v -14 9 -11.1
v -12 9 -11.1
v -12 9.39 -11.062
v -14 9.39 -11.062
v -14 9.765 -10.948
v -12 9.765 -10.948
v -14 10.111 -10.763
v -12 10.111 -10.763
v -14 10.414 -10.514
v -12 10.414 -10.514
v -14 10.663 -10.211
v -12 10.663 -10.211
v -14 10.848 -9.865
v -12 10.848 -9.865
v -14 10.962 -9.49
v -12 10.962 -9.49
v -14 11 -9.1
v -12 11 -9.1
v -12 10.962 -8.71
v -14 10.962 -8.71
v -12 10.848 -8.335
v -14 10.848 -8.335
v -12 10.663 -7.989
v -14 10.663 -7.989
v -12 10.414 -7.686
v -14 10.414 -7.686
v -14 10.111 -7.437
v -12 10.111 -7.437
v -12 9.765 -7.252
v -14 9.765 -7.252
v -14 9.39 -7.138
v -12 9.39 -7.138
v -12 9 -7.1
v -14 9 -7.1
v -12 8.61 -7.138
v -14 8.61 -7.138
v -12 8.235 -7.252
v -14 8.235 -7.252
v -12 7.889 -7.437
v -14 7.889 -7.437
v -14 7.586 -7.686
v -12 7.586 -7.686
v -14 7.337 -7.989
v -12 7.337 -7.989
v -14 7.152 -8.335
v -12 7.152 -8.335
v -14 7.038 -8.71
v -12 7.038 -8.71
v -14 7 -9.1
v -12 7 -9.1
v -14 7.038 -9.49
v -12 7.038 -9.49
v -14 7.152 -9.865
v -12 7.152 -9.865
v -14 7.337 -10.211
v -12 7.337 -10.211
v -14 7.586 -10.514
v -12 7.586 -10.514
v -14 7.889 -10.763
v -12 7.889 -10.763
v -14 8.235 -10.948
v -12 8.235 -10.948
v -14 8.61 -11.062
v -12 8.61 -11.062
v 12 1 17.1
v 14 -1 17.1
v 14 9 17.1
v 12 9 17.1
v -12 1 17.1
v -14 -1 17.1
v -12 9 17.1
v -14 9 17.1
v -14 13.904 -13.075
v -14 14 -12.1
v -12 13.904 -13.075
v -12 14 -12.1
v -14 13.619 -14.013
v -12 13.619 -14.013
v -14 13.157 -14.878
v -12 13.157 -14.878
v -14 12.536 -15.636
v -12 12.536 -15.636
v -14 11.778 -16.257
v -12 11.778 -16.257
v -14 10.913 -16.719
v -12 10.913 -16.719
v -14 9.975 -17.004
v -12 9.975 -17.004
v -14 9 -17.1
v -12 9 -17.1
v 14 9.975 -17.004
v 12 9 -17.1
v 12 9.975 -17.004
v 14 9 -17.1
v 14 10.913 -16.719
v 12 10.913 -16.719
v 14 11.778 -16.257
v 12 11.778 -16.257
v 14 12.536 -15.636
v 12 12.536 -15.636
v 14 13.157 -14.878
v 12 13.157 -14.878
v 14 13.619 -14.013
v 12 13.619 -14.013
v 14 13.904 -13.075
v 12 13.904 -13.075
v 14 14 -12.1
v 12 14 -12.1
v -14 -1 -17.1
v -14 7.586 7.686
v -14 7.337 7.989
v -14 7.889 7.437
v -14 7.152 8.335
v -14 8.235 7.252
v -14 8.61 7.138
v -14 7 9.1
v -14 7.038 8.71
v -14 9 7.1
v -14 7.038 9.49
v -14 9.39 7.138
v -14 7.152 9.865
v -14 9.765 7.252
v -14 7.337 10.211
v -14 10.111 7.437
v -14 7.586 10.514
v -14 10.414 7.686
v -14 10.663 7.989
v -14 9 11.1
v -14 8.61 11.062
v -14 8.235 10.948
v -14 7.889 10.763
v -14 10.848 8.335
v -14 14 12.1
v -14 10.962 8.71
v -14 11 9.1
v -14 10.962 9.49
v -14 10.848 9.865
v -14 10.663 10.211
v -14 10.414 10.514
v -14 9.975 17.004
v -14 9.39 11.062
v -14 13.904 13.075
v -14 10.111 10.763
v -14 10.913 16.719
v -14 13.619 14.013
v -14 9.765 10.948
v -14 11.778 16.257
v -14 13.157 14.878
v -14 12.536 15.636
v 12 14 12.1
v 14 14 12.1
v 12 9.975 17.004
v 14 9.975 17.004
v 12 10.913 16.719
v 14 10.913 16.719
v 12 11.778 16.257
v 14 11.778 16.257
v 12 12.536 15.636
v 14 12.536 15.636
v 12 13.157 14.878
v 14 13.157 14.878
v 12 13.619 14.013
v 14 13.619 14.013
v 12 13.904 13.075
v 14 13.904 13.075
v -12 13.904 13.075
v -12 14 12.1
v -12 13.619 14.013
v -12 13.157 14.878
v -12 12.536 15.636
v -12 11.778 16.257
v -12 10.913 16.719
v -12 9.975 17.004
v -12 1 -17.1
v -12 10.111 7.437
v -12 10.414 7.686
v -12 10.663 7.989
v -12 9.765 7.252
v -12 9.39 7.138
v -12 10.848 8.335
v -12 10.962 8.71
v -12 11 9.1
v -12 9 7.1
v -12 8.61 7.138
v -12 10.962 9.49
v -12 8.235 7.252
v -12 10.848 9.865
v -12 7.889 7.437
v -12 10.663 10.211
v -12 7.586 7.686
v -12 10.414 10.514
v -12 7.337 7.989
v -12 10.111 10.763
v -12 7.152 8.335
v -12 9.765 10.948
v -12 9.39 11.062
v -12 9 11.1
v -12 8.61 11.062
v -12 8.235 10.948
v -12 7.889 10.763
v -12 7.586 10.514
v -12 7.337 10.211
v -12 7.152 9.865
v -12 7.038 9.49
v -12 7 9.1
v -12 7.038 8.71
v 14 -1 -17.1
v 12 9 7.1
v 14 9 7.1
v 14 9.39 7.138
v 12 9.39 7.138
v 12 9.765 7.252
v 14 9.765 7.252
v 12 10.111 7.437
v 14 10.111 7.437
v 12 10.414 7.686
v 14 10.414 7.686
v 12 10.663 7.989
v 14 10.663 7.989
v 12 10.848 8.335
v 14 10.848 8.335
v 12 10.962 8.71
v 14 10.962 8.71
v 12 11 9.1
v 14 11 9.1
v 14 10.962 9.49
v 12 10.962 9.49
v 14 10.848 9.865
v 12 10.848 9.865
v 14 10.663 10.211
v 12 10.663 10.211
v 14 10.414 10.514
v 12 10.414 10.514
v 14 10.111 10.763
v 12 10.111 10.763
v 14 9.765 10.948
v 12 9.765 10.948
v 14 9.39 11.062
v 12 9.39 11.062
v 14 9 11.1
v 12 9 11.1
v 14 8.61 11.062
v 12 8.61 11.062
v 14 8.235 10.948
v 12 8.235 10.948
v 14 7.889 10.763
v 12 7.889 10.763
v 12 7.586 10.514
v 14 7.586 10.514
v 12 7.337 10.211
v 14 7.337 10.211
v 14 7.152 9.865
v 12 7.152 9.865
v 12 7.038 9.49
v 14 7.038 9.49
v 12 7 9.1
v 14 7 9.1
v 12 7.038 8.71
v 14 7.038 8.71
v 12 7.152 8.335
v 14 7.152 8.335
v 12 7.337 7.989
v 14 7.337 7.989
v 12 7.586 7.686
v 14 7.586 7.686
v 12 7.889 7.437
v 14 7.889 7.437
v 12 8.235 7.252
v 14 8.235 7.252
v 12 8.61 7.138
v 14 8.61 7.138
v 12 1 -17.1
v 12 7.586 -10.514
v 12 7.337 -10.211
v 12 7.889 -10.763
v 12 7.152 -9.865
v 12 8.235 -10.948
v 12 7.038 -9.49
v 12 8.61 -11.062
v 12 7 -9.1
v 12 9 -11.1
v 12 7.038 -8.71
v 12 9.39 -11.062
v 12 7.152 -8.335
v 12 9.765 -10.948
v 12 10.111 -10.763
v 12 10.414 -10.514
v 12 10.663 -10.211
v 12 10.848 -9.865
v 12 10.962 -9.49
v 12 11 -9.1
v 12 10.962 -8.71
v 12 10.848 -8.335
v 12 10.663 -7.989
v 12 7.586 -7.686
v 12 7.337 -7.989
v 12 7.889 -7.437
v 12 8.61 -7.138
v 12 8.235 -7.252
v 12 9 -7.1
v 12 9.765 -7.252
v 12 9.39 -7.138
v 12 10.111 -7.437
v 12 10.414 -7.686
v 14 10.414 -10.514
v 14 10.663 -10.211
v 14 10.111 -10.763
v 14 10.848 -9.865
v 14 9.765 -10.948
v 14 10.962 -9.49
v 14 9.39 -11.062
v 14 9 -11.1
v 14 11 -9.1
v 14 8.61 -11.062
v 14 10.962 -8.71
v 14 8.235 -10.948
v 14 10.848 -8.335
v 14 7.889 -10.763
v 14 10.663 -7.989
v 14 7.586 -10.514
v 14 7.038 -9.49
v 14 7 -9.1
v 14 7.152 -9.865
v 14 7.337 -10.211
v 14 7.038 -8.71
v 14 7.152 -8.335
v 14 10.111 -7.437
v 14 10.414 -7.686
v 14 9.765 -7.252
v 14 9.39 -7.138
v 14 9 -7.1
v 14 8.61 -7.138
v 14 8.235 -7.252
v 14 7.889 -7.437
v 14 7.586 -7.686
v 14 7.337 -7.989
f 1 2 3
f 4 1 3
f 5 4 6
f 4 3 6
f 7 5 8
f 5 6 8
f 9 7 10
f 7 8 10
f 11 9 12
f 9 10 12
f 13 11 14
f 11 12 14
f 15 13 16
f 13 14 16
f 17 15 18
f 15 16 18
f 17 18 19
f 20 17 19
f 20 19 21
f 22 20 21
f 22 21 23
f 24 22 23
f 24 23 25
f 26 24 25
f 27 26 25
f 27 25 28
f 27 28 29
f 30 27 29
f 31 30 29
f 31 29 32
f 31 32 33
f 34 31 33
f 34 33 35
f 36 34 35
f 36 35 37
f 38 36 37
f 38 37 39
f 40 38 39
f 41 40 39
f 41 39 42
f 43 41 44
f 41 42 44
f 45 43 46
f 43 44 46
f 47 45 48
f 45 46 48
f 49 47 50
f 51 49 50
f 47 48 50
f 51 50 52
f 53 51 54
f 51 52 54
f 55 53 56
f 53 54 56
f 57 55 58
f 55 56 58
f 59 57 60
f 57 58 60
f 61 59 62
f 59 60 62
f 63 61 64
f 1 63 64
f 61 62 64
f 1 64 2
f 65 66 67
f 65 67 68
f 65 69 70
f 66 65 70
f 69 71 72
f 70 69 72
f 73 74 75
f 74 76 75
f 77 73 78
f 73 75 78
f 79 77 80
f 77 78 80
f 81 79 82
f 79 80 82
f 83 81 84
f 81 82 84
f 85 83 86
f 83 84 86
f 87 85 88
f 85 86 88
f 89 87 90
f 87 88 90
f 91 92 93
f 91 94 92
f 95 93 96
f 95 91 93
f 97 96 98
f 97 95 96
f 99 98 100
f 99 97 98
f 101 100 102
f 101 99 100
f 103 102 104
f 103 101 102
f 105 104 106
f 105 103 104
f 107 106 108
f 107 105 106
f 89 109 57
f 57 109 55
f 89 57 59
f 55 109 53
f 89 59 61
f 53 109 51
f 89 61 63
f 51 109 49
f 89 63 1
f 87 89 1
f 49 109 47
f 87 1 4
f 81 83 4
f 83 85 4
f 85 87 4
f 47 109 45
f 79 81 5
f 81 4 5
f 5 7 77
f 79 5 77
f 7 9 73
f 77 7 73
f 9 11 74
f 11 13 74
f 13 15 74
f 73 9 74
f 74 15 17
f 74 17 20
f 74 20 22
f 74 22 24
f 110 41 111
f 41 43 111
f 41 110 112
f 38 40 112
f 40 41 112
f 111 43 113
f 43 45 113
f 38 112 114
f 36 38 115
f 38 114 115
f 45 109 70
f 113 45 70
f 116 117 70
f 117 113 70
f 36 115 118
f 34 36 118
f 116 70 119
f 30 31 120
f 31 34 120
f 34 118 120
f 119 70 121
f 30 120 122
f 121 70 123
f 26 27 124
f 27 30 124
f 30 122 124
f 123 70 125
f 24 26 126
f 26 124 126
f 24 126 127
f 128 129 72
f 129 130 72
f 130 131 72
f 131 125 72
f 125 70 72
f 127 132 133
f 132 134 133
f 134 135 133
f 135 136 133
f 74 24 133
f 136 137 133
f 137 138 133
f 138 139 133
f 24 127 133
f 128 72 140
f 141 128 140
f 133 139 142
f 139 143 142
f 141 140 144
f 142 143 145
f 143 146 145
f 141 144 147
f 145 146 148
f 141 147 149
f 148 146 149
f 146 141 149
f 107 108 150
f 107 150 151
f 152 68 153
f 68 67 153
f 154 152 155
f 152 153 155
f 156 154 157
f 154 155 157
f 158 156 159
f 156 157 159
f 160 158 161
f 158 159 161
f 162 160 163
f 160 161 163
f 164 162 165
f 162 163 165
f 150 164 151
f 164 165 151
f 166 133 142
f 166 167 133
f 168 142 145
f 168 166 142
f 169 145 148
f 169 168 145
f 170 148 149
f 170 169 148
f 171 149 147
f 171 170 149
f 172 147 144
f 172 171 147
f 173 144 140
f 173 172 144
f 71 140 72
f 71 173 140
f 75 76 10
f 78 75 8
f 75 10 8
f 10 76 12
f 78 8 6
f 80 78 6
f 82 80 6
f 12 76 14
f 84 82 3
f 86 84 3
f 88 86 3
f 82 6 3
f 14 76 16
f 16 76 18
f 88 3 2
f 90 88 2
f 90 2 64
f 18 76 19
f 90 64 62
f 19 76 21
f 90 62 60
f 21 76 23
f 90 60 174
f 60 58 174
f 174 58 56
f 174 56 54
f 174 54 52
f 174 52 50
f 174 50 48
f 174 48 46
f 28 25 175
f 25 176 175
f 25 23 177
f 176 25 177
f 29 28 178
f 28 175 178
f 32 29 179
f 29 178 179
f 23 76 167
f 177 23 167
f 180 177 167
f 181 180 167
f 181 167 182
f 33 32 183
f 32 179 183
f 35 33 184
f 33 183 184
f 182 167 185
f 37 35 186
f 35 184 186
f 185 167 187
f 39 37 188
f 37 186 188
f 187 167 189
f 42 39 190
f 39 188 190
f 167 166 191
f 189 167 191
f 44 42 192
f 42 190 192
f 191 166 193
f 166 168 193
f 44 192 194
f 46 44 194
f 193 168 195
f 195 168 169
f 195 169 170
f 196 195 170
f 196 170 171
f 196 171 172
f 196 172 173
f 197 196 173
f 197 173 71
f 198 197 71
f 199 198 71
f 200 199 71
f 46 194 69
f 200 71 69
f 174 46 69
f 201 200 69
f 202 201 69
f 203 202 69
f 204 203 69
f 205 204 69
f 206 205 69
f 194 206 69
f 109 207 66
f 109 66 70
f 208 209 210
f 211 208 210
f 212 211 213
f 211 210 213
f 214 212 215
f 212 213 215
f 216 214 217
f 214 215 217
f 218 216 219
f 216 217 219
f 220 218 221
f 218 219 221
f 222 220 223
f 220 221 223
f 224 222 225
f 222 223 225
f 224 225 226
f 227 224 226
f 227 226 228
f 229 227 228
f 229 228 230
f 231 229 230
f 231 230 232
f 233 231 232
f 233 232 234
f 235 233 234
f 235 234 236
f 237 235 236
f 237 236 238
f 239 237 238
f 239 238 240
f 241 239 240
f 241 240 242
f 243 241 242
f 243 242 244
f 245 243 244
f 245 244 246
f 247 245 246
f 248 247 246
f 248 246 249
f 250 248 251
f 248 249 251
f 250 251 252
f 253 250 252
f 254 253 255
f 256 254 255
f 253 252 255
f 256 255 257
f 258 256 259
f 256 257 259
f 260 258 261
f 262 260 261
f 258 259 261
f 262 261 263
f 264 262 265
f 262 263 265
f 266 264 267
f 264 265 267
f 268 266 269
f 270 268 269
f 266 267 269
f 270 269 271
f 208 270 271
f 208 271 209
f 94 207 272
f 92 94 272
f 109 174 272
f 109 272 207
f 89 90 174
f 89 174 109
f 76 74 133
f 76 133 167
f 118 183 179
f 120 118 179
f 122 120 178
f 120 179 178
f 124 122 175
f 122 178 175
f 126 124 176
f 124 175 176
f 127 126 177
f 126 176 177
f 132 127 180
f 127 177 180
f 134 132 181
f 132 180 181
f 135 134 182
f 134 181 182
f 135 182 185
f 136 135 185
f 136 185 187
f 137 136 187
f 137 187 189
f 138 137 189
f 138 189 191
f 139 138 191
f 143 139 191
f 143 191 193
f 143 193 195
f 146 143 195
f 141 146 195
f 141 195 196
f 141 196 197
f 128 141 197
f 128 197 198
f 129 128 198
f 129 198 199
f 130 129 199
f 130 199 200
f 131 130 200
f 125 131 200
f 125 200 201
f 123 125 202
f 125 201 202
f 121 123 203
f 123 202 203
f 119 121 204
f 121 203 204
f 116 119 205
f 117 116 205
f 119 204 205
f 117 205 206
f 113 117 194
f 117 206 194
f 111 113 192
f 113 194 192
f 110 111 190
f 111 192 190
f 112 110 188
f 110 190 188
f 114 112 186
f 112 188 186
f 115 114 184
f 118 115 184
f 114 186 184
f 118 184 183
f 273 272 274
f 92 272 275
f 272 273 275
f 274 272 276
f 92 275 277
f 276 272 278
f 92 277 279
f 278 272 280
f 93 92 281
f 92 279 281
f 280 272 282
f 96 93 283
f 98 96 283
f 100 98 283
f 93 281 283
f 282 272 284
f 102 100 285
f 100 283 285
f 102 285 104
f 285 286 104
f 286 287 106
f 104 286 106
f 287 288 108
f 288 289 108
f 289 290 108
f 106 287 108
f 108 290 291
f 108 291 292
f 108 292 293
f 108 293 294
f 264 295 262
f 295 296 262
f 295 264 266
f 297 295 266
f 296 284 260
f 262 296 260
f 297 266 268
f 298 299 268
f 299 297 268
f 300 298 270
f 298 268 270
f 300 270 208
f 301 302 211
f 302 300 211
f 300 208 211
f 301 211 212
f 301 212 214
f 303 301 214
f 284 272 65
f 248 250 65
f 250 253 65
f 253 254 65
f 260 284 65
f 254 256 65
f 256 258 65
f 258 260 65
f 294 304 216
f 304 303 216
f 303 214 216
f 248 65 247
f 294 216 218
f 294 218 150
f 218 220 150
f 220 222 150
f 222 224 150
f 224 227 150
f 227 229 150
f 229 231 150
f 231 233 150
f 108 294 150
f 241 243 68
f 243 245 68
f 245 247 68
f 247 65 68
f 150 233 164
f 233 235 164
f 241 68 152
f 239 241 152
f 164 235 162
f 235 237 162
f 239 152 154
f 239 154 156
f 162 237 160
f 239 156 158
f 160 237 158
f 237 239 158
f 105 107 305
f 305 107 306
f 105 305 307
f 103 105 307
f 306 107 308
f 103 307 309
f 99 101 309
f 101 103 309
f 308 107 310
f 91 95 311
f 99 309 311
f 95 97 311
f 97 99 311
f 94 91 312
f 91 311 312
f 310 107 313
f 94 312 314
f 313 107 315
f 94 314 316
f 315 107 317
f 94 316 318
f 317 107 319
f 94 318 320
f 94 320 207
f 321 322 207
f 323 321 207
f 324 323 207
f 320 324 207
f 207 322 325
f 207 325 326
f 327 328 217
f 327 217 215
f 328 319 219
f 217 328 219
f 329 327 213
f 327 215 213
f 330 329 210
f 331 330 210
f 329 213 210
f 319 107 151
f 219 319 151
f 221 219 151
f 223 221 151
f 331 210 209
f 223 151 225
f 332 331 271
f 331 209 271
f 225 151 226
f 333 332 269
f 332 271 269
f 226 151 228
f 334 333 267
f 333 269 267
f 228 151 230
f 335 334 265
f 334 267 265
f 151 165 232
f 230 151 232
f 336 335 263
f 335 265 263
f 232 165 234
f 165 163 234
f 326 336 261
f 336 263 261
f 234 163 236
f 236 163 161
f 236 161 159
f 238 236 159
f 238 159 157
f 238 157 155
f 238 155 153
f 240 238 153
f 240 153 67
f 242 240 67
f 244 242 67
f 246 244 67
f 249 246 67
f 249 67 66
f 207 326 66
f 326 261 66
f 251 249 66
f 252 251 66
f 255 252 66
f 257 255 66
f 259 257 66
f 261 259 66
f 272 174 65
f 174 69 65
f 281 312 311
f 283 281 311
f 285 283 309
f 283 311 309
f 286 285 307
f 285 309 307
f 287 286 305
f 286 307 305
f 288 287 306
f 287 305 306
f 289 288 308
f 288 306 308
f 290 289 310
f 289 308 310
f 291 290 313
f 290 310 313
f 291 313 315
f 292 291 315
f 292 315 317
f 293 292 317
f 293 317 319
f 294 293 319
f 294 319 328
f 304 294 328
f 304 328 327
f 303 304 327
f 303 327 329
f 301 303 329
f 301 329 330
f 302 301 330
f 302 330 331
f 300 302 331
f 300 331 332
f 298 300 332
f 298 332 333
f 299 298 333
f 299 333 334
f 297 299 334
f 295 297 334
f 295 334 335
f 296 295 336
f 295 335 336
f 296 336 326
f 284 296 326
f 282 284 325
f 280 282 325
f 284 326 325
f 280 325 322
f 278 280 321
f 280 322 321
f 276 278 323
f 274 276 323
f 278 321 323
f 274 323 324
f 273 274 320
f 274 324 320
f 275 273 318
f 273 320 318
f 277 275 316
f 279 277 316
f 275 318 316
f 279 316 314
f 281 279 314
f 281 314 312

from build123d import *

# Parameters (mm, degrees)
BOSS_EXTRUDE1_DEPTH     = 17.1
SKETCH2_R               = 2
CUT_EXTRUDE1_DEPTH      = 1
CUT_EXTRUDE1_DEPTH_BACK = 29
FILLET1_R               = 5


with BuildPart() as part:
    # Sketch1 → Boss-Extrude1 (new body, symmetric)
    with BuildSketch(Plane.XY):
        Polygon((-14, 14), (-12, 14), (-12, 1), (12, 1), (12, 14), (14, 14), (14, -1), (-14, -1), align=None)
    extrude(amount=BOSS_EXTRUDE1_DEPTH, both=True)

    # Sketch2 → Cut-Extrude1 (cut, two sides)
    with BuildSketch(Plane(origin=(14, 0, 0), x_dir=(0, 0, -1), z_dir=(1, 0, 0))) as cut_extrude1_sk:
        with Locations((-9.1, 9)):
            Circle(SKETCH2_R)
        with Locations((9.1, 9)):
            Circle(SKETCH2_R)
    extrude(amount=CUT_EXTRUDE1_DEPTH, mode=Mode.SUBTRACT)
    extrude(cut_extrude1_sk.sketch, amount=-CUT_EXTRUDE1_DEPTH_BACK, mode=Mode.SUBTRACT)

    # Fillet1
    fillet1_edges = [part.edges().sort_by_distance(p)[0] for p in [
        (13, 14, -17.1),
        (13, 14, 17.1),
        (-13, 14, 17.1),
        (-13, 14, -17.1),
    ]]
    fillet(fillet1_edges, radius=FILLET1_R)


solid = part.part
